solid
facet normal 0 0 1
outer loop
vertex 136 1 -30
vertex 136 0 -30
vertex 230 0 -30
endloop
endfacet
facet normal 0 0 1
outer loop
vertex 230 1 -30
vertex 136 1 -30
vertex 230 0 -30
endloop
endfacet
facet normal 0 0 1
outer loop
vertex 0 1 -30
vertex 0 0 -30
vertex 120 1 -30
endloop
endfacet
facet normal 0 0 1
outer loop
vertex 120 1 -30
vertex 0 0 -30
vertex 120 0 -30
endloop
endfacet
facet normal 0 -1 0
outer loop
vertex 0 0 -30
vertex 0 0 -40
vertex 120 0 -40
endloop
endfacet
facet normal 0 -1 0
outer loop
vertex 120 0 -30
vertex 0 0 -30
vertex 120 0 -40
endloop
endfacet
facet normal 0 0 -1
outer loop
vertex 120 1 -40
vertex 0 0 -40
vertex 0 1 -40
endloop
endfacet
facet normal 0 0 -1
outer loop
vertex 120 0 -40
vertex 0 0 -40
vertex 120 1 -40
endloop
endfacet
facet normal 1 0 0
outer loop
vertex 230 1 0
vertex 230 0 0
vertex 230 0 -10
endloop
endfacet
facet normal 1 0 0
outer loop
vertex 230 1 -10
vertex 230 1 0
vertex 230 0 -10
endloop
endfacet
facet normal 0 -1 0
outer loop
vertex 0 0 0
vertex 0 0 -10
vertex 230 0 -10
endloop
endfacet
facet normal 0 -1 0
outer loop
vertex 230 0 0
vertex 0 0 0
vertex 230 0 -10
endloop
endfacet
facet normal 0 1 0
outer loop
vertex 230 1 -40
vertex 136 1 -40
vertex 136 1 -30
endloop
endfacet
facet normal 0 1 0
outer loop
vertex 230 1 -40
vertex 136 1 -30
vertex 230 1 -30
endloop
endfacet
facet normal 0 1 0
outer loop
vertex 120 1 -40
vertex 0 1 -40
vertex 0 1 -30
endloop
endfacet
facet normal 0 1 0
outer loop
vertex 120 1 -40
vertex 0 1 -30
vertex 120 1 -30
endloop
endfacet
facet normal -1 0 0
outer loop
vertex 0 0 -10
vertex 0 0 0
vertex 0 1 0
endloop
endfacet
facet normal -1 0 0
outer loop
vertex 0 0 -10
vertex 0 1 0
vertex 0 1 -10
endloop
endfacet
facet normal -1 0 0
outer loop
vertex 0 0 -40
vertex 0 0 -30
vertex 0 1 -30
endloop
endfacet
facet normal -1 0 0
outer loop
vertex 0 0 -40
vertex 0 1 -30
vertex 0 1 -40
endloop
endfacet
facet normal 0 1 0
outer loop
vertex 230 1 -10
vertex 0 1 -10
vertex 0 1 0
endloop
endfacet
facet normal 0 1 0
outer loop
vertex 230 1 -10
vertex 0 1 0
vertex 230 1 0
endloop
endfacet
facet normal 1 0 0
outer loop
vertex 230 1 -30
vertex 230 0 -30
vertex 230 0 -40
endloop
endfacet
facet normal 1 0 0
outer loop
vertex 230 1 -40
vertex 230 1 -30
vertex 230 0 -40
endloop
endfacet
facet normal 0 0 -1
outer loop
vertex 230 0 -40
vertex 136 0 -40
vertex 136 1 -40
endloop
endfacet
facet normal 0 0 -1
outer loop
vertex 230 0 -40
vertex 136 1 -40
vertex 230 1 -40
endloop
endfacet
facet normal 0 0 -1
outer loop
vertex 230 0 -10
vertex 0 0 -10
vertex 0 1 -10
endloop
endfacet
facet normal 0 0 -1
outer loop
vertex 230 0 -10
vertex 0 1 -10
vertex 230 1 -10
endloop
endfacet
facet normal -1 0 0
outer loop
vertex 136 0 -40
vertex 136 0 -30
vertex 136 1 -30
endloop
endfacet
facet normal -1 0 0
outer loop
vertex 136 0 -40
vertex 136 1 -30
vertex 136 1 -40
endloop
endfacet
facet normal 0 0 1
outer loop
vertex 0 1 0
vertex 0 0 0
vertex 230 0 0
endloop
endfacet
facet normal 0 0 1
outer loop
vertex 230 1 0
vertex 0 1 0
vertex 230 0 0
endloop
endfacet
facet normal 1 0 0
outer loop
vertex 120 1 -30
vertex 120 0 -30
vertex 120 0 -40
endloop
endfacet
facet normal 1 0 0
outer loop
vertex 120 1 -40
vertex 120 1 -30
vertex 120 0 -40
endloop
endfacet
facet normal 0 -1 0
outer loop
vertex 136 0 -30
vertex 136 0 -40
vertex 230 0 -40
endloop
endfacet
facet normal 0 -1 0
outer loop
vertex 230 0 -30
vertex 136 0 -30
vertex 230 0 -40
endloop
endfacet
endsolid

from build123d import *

# Parameters (mm, degrees)
SKETCH1_W             = 230
SKETCH1_H             = 10
BOSS_EXTRUDE1_DEPTH   = 1
SKETCH1_W_2           = 94
BOSS_EXTRUDE1_2_DEPTH = 1
SKETCH1_W_3           = 120
BOSS_EXTRUDE1_3_DEPTH = 1


with BuildPart() as part:
    # Sketch1 → Boss-Extrude1 (new body)
    with BuildSketch(Plane(origin=(0, 0, 0), x_dir=(1, 0, 0), z_dir=(0, 1, 0))):
        with Locations((115, 5)):
            Rectangle(SKETCH1_W, SKETCH1_H)
    extrude(amount=BOSS_EXTRUDE1_DEPTH)


with BuildPart() as body_2:
    # Sketch1 → Boss-Extrude1 2 (new body)
    with BuildSketch(Plane(origin=(0, 0, 0), x_dir=(1, 0, 0), z_dir=(0, 1, 0))):
        with Locations((183, 35)):
            Rectangle(SKETCH1_W_2, SKETCH1_H)
    extrude(amount=BOSS_EXTRUDE1_2_DEPTH)


with BuildPart() as body_3:
    # Sketch1 → Boss-Extrude1 3 (new body)
    with BuildSketch(Plane(origin=(0, 0, 0), x_dir=(1, 0, 0), z_dir=(0, 1, 0))):
        with Locations((60, 35)):
            Rectangle(SKETCH1_W_3, SKETCH1_H)
    extrude(amount=BOSS_EXTRUDE1_3_DEPTH)


solid = Compound([part.part, body_2.part, body_3.part])
